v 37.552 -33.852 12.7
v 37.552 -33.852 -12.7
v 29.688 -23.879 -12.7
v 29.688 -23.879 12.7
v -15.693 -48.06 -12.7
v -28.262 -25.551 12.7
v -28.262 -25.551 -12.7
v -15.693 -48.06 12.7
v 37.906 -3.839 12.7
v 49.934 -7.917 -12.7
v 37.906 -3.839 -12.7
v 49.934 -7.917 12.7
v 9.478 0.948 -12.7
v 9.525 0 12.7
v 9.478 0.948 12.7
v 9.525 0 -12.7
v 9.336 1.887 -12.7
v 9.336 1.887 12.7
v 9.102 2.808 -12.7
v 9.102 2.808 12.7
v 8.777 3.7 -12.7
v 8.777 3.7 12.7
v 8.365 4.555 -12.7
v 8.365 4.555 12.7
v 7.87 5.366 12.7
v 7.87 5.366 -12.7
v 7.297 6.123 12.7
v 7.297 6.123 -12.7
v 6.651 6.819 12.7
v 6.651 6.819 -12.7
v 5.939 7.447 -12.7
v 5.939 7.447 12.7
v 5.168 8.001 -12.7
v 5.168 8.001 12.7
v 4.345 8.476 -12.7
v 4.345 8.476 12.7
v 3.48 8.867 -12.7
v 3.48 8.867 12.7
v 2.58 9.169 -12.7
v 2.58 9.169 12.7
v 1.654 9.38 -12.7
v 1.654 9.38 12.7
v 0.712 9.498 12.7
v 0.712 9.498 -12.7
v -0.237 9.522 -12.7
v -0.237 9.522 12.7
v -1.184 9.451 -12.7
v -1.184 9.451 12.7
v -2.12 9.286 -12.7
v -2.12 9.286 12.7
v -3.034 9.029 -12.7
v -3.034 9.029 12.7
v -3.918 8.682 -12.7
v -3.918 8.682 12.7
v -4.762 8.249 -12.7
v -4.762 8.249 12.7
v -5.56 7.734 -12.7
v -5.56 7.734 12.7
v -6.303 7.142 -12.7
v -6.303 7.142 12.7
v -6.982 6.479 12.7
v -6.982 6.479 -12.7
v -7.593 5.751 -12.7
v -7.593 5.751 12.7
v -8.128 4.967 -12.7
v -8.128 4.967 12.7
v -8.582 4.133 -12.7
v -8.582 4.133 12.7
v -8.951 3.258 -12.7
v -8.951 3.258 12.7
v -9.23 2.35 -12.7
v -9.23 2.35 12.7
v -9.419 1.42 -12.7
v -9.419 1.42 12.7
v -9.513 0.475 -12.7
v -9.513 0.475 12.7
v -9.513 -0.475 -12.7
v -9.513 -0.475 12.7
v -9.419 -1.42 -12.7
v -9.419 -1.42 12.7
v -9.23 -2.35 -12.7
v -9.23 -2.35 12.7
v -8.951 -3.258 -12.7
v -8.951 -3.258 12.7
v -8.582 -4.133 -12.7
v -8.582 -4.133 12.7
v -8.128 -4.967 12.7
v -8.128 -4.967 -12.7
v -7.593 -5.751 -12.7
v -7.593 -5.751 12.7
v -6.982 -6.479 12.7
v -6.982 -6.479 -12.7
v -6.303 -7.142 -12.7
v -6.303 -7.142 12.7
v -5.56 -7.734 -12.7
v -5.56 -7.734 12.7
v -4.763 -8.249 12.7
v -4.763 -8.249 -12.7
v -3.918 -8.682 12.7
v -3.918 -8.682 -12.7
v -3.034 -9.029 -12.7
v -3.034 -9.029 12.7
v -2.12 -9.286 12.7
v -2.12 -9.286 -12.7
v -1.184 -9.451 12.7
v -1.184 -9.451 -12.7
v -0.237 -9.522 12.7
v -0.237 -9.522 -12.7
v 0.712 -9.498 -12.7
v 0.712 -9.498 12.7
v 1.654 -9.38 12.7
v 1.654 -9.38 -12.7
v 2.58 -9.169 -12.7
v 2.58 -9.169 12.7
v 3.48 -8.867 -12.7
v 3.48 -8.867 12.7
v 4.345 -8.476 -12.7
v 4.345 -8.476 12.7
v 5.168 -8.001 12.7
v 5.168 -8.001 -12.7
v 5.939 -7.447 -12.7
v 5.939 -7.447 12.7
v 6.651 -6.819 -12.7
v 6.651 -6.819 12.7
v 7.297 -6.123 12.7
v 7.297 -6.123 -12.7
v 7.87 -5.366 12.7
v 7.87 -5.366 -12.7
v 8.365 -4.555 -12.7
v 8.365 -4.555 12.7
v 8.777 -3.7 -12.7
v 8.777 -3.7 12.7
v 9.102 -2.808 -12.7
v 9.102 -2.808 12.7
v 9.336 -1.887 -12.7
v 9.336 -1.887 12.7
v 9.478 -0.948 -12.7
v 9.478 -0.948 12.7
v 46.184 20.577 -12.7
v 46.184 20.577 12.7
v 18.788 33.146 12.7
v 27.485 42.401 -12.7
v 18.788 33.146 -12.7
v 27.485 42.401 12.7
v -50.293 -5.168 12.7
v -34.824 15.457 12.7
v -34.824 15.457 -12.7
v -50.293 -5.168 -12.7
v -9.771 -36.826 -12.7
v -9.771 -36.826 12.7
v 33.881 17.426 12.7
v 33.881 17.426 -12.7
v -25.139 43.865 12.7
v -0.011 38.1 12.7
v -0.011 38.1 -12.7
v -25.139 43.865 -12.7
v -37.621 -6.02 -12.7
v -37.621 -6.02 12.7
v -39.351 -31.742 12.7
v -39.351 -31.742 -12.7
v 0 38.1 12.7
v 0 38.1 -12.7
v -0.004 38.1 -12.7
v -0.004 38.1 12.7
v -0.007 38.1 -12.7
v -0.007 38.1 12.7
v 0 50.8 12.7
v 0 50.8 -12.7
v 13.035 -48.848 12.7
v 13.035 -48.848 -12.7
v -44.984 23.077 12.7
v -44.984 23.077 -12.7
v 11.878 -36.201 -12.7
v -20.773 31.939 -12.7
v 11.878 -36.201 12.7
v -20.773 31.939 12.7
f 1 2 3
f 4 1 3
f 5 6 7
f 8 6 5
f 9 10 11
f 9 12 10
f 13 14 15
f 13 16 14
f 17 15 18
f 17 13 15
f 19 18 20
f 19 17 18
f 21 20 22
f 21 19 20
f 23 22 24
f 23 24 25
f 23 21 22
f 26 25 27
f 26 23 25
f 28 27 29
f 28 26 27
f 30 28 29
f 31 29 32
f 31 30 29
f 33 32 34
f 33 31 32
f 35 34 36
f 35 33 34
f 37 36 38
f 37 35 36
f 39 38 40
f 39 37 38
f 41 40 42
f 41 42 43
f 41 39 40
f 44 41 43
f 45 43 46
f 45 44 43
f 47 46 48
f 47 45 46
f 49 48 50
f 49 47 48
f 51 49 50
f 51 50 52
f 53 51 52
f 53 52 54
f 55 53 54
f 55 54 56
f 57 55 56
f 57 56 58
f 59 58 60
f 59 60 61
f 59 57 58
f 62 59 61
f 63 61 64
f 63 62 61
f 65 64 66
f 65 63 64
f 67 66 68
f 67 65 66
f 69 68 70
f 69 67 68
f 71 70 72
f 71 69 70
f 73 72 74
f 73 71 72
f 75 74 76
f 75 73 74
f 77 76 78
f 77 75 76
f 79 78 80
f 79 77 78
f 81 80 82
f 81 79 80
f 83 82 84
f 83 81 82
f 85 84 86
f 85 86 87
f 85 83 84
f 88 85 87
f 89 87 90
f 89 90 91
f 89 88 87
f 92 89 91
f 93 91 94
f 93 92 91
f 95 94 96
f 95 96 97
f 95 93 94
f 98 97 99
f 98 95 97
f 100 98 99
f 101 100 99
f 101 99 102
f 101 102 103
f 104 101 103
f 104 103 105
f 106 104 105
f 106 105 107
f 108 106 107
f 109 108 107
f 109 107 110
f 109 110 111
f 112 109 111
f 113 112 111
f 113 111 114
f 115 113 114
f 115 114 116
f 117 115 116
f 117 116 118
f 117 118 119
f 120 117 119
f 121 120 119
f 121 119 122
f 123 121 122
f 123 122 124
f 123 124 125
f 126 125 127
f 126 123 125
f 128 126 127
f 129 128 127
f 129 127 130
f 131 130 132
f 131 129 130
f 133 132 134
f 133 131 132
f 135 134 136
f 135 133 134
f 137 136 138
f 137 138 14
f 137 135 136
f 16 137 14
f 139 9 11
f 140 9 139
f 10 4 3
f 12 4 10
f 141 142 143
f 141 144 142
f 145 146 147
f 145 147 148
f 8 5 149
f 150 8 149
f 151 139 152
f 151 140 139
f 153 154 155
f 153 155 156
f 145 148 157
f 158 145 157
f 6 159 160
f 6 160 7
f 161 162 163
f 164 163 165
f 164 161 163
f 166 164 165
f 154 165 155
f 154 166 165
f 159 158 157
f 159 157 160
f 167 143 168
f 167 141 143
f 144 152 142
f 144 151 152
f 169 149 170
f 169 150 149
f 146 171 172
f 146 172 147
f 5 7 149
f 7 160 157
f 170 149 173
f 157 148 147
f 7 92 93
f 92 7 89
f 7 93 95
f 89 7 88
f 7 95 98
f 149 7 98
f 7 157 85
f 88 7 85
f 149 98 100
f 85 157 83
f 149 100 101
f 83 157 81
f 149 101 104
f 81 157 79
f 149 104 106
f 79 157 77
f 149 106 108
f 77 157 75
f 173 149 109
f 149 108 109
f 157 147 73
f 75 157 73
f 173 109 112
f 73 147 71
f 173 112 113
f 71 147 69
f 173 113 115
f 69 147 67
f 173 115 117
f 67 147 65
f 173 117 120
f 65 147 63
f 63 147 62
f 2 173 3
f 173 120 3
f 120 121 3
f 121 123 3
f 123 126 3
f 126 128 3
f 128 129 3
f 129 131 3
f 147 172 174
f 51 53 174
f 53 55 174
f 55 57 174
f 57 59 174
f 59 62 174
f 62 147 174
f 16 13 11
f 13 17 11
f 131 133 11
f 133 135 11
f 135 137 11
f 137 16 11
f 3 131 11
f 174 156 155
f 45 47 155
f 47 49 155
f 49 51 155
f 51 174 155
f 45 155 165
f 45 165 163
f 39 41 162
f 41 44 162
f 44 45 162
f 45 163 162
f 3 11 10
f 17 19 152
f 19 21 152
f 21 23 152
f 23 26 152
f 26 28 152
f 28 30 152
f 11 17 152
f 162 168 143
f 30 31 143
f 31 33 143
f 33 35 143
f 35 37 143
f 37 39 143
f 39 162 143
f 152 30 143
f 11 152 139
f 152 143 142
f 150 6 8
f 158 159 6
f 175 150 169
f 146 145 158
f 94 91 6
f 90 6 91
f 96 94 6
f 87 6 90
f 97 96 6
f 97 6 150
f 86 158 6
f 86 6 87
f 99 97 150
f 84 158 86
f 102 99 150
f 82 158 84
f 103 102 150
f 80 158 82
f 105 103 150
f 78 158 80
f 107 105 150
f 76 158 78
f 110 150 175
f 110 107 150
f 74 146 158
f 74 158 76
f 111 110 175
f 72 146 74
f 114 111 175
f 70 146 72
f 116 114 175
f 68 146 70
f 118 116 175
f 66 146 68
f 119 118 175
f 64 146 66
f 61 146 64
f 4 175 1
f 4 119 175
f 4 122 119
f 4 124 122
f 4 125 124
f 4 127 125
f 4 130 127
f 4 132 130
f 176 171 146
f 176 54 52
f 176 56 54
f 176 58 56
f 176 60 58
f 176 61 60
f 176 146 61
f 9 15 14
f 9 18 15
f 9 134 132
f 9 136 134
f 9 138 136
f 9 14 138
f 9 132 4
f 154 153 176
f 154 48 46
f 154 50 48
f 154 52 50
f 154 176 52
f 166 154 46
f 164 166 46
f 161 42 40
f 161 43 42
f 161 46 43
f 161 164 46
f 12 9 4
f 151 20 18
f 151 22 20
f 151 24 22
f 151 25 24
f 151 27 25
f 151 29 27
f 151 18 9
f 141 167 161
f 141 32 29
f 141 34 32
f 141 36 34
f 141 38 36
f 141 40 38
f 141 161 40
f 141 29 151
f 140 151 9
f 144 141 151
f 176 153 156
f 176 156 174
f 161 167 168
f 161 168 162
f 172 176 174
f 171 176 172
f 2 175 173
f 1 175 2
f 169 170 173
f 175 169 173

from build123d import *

# Parameters (mm, degrees)
F0_R     = 9.525
F1_DEPTH = 12.7


with BuildPart() as f1:
    # F0 (on Top) → F1 (new body, symmetric)
    with BuildSketch(Plane.XY):
        with BuildLine():
            ThreePointArc((0, 38.1), (9.715033, 36.840577), (18.787791, 33.145571))
            Line((18.787791, 33.145571), (0, 50.8))
            Line((0, 50.8), (0, 38.1))
        make_face()
        with BuildLine():
            ThreePointArc((-20.773422, 31.938612), (-10.838983, 36.525696), (-0.010502, 38.099999))
            Line((-0.010502, 38.099999), (-25.138711, 43.864812))
            Line((-25.138711, 43.864812), (-20.773422, 31.938612))
        make_face()
        with BuildLine():
            ThreePointArc((-34.823787, 15.45684), (-28.994389, 24.717107), (-20.773422, 31.938612))
            Line((-20.773422, 31.938612), (-44.983609, 23.077076))
            Line((-44.983609, 23.077076), (-34.823787, 15.45684))
        make_face()
        with BuildLine():
            ThreePointArc((-37.621473, -6.019531), (-37.780783, 4.921632), (-34.823787, 15.45684))
            Line((-34.823787, 15.45684), (-50.292867, -5.1676))
            Line((-50.292867, -5.1676), (-37.621473, -6.019531))
        make_face()
        with BuildLine():
            Line((-39.350893, -31.74246), (-28.26246, -25.550799))
            ThreePointArc((-28.26246, -25.550799), (-34.358999, -16.46418), (-37.621473, -6.019531))
            Line((-37.621473, -6.019531), (-39.350893, -31.74246))
        make_face()
        with BuildLine():
            Line((-15.693389, -48.060318), (-9.770946, -36.825787))
            ThreePointArc((-9.770946, -36.825787), (-19.834726, -32.529889), (-28.26246, -25.550799))
            Line((-28.26246, -25.550799), (-15.693389, -48.060318))
        make_face()
        with BuildLine():
            Line((13.03515, -48.848346), (11.877897, -36.201182))
            ThreePointArc((11.877897, -36.201182), (1.098792, -38.084152), (-9.770946, -36.825787))
            Line((-9.770946, -36.825787), (13.03515, -48.848346))
        make_face()
        with BuildLine():
            Line((37.55164, -33.851957), (29.688458, -23.878975))
            ThreePointArc((29.688458, -23.878975), (21.677169, -31.332257), (11.877897, -36.201182))
            Line((11.877897, -36.201182), (37.55164, -33.851957))
        make_face()
        with BuildLine():
            Line((49.933612, -7.916716), (37.906115, -3.838811))
            ThreePointArc((37.906115, -3.838811), (35.251363, -14.455151), (29.688458, -23.878975))
            Line((29.688458, -23.878975), (49.933612, -7.916716))
        make_face()
        with BuildLine():
            ThreePointArc((33.881408, 17.425849), (37.030336, 8.964607), (38.1, 0))
            ThreePointArc((38.1, 0), (38.051498, -1.921852), (37.906115, -3.838811))
            Line((37.906115, -3.838811), (46.184261, 20.577008))
            Line((46.184261, 20.577008), (33.881408, 17.425849))
        make_face()
        with BuildLine():
            ThreePointArc((18.787791, 33.145571), (27.482514, 26.387903), (33.881408, 17.425849))
            Line((33.881408, 17.425849), (27.484554, 42.400641))
            Line((27.484554, 42.400641), (18.787791, 33.145571))
        make_face()
        with BuildLine():
            ThreePointArc((37.906115, -3.838811), (38.051498, -1.921852), (38.1, 0))
            ThreePointArc((38.1, 0), (37.030336, 8.964607), (33.881408, 17.425849))
            ThreePointArc((33.881408, 17.425849), (27.482514, 26.387903), (18.787791, 33.145571))
            ThreePointArc((18.787791, 33.145571), (9.715033, 36.840577), (0, 38.1))
            ThreePointArc((0, 38.1), (-0.005251, 38.1), (-0.010502, 38.099999))
            ThreePointArc((-0.010502, 38.099999), (-10.838983, 36.525696), (-20.773422, 31.938612))
            ThreePointArc((-20.773422, 31.938612), (-28.994389, 24.717107), (-34.823787, 15.45684))
            ThreePointArc((-34.823787, 15.45684), (-37.780783, 4.921632), (-37.621473, -6.019531))
            ThreePointArc((-37.621473, -6.019531), (-34.358999, -16.46418), (-28.26246, -25.550799))
            ThreePointArc((-28.26246, -25.550799), (-19.834726, -32.529889), (-9.770946, -36.825787))
            ThreePointArc((-9.770946, -36.825787), (1.098792, -38.084152), (11.877897, -36.201182))
            ThreePointArc((11.877897, -36.201182), (21.677169, -31.332257), (29.688458, -23.878975))
            ThreePointArc((29.688458, -23.878975), (35.251363, -14.455151), (37.906115, -3.838811))
        make_face()
        Circle(F0_R, mode=Mode.SUBTRACT)
    extrude(amount=F1_DEPTH, both=True)


solid = f1.part
